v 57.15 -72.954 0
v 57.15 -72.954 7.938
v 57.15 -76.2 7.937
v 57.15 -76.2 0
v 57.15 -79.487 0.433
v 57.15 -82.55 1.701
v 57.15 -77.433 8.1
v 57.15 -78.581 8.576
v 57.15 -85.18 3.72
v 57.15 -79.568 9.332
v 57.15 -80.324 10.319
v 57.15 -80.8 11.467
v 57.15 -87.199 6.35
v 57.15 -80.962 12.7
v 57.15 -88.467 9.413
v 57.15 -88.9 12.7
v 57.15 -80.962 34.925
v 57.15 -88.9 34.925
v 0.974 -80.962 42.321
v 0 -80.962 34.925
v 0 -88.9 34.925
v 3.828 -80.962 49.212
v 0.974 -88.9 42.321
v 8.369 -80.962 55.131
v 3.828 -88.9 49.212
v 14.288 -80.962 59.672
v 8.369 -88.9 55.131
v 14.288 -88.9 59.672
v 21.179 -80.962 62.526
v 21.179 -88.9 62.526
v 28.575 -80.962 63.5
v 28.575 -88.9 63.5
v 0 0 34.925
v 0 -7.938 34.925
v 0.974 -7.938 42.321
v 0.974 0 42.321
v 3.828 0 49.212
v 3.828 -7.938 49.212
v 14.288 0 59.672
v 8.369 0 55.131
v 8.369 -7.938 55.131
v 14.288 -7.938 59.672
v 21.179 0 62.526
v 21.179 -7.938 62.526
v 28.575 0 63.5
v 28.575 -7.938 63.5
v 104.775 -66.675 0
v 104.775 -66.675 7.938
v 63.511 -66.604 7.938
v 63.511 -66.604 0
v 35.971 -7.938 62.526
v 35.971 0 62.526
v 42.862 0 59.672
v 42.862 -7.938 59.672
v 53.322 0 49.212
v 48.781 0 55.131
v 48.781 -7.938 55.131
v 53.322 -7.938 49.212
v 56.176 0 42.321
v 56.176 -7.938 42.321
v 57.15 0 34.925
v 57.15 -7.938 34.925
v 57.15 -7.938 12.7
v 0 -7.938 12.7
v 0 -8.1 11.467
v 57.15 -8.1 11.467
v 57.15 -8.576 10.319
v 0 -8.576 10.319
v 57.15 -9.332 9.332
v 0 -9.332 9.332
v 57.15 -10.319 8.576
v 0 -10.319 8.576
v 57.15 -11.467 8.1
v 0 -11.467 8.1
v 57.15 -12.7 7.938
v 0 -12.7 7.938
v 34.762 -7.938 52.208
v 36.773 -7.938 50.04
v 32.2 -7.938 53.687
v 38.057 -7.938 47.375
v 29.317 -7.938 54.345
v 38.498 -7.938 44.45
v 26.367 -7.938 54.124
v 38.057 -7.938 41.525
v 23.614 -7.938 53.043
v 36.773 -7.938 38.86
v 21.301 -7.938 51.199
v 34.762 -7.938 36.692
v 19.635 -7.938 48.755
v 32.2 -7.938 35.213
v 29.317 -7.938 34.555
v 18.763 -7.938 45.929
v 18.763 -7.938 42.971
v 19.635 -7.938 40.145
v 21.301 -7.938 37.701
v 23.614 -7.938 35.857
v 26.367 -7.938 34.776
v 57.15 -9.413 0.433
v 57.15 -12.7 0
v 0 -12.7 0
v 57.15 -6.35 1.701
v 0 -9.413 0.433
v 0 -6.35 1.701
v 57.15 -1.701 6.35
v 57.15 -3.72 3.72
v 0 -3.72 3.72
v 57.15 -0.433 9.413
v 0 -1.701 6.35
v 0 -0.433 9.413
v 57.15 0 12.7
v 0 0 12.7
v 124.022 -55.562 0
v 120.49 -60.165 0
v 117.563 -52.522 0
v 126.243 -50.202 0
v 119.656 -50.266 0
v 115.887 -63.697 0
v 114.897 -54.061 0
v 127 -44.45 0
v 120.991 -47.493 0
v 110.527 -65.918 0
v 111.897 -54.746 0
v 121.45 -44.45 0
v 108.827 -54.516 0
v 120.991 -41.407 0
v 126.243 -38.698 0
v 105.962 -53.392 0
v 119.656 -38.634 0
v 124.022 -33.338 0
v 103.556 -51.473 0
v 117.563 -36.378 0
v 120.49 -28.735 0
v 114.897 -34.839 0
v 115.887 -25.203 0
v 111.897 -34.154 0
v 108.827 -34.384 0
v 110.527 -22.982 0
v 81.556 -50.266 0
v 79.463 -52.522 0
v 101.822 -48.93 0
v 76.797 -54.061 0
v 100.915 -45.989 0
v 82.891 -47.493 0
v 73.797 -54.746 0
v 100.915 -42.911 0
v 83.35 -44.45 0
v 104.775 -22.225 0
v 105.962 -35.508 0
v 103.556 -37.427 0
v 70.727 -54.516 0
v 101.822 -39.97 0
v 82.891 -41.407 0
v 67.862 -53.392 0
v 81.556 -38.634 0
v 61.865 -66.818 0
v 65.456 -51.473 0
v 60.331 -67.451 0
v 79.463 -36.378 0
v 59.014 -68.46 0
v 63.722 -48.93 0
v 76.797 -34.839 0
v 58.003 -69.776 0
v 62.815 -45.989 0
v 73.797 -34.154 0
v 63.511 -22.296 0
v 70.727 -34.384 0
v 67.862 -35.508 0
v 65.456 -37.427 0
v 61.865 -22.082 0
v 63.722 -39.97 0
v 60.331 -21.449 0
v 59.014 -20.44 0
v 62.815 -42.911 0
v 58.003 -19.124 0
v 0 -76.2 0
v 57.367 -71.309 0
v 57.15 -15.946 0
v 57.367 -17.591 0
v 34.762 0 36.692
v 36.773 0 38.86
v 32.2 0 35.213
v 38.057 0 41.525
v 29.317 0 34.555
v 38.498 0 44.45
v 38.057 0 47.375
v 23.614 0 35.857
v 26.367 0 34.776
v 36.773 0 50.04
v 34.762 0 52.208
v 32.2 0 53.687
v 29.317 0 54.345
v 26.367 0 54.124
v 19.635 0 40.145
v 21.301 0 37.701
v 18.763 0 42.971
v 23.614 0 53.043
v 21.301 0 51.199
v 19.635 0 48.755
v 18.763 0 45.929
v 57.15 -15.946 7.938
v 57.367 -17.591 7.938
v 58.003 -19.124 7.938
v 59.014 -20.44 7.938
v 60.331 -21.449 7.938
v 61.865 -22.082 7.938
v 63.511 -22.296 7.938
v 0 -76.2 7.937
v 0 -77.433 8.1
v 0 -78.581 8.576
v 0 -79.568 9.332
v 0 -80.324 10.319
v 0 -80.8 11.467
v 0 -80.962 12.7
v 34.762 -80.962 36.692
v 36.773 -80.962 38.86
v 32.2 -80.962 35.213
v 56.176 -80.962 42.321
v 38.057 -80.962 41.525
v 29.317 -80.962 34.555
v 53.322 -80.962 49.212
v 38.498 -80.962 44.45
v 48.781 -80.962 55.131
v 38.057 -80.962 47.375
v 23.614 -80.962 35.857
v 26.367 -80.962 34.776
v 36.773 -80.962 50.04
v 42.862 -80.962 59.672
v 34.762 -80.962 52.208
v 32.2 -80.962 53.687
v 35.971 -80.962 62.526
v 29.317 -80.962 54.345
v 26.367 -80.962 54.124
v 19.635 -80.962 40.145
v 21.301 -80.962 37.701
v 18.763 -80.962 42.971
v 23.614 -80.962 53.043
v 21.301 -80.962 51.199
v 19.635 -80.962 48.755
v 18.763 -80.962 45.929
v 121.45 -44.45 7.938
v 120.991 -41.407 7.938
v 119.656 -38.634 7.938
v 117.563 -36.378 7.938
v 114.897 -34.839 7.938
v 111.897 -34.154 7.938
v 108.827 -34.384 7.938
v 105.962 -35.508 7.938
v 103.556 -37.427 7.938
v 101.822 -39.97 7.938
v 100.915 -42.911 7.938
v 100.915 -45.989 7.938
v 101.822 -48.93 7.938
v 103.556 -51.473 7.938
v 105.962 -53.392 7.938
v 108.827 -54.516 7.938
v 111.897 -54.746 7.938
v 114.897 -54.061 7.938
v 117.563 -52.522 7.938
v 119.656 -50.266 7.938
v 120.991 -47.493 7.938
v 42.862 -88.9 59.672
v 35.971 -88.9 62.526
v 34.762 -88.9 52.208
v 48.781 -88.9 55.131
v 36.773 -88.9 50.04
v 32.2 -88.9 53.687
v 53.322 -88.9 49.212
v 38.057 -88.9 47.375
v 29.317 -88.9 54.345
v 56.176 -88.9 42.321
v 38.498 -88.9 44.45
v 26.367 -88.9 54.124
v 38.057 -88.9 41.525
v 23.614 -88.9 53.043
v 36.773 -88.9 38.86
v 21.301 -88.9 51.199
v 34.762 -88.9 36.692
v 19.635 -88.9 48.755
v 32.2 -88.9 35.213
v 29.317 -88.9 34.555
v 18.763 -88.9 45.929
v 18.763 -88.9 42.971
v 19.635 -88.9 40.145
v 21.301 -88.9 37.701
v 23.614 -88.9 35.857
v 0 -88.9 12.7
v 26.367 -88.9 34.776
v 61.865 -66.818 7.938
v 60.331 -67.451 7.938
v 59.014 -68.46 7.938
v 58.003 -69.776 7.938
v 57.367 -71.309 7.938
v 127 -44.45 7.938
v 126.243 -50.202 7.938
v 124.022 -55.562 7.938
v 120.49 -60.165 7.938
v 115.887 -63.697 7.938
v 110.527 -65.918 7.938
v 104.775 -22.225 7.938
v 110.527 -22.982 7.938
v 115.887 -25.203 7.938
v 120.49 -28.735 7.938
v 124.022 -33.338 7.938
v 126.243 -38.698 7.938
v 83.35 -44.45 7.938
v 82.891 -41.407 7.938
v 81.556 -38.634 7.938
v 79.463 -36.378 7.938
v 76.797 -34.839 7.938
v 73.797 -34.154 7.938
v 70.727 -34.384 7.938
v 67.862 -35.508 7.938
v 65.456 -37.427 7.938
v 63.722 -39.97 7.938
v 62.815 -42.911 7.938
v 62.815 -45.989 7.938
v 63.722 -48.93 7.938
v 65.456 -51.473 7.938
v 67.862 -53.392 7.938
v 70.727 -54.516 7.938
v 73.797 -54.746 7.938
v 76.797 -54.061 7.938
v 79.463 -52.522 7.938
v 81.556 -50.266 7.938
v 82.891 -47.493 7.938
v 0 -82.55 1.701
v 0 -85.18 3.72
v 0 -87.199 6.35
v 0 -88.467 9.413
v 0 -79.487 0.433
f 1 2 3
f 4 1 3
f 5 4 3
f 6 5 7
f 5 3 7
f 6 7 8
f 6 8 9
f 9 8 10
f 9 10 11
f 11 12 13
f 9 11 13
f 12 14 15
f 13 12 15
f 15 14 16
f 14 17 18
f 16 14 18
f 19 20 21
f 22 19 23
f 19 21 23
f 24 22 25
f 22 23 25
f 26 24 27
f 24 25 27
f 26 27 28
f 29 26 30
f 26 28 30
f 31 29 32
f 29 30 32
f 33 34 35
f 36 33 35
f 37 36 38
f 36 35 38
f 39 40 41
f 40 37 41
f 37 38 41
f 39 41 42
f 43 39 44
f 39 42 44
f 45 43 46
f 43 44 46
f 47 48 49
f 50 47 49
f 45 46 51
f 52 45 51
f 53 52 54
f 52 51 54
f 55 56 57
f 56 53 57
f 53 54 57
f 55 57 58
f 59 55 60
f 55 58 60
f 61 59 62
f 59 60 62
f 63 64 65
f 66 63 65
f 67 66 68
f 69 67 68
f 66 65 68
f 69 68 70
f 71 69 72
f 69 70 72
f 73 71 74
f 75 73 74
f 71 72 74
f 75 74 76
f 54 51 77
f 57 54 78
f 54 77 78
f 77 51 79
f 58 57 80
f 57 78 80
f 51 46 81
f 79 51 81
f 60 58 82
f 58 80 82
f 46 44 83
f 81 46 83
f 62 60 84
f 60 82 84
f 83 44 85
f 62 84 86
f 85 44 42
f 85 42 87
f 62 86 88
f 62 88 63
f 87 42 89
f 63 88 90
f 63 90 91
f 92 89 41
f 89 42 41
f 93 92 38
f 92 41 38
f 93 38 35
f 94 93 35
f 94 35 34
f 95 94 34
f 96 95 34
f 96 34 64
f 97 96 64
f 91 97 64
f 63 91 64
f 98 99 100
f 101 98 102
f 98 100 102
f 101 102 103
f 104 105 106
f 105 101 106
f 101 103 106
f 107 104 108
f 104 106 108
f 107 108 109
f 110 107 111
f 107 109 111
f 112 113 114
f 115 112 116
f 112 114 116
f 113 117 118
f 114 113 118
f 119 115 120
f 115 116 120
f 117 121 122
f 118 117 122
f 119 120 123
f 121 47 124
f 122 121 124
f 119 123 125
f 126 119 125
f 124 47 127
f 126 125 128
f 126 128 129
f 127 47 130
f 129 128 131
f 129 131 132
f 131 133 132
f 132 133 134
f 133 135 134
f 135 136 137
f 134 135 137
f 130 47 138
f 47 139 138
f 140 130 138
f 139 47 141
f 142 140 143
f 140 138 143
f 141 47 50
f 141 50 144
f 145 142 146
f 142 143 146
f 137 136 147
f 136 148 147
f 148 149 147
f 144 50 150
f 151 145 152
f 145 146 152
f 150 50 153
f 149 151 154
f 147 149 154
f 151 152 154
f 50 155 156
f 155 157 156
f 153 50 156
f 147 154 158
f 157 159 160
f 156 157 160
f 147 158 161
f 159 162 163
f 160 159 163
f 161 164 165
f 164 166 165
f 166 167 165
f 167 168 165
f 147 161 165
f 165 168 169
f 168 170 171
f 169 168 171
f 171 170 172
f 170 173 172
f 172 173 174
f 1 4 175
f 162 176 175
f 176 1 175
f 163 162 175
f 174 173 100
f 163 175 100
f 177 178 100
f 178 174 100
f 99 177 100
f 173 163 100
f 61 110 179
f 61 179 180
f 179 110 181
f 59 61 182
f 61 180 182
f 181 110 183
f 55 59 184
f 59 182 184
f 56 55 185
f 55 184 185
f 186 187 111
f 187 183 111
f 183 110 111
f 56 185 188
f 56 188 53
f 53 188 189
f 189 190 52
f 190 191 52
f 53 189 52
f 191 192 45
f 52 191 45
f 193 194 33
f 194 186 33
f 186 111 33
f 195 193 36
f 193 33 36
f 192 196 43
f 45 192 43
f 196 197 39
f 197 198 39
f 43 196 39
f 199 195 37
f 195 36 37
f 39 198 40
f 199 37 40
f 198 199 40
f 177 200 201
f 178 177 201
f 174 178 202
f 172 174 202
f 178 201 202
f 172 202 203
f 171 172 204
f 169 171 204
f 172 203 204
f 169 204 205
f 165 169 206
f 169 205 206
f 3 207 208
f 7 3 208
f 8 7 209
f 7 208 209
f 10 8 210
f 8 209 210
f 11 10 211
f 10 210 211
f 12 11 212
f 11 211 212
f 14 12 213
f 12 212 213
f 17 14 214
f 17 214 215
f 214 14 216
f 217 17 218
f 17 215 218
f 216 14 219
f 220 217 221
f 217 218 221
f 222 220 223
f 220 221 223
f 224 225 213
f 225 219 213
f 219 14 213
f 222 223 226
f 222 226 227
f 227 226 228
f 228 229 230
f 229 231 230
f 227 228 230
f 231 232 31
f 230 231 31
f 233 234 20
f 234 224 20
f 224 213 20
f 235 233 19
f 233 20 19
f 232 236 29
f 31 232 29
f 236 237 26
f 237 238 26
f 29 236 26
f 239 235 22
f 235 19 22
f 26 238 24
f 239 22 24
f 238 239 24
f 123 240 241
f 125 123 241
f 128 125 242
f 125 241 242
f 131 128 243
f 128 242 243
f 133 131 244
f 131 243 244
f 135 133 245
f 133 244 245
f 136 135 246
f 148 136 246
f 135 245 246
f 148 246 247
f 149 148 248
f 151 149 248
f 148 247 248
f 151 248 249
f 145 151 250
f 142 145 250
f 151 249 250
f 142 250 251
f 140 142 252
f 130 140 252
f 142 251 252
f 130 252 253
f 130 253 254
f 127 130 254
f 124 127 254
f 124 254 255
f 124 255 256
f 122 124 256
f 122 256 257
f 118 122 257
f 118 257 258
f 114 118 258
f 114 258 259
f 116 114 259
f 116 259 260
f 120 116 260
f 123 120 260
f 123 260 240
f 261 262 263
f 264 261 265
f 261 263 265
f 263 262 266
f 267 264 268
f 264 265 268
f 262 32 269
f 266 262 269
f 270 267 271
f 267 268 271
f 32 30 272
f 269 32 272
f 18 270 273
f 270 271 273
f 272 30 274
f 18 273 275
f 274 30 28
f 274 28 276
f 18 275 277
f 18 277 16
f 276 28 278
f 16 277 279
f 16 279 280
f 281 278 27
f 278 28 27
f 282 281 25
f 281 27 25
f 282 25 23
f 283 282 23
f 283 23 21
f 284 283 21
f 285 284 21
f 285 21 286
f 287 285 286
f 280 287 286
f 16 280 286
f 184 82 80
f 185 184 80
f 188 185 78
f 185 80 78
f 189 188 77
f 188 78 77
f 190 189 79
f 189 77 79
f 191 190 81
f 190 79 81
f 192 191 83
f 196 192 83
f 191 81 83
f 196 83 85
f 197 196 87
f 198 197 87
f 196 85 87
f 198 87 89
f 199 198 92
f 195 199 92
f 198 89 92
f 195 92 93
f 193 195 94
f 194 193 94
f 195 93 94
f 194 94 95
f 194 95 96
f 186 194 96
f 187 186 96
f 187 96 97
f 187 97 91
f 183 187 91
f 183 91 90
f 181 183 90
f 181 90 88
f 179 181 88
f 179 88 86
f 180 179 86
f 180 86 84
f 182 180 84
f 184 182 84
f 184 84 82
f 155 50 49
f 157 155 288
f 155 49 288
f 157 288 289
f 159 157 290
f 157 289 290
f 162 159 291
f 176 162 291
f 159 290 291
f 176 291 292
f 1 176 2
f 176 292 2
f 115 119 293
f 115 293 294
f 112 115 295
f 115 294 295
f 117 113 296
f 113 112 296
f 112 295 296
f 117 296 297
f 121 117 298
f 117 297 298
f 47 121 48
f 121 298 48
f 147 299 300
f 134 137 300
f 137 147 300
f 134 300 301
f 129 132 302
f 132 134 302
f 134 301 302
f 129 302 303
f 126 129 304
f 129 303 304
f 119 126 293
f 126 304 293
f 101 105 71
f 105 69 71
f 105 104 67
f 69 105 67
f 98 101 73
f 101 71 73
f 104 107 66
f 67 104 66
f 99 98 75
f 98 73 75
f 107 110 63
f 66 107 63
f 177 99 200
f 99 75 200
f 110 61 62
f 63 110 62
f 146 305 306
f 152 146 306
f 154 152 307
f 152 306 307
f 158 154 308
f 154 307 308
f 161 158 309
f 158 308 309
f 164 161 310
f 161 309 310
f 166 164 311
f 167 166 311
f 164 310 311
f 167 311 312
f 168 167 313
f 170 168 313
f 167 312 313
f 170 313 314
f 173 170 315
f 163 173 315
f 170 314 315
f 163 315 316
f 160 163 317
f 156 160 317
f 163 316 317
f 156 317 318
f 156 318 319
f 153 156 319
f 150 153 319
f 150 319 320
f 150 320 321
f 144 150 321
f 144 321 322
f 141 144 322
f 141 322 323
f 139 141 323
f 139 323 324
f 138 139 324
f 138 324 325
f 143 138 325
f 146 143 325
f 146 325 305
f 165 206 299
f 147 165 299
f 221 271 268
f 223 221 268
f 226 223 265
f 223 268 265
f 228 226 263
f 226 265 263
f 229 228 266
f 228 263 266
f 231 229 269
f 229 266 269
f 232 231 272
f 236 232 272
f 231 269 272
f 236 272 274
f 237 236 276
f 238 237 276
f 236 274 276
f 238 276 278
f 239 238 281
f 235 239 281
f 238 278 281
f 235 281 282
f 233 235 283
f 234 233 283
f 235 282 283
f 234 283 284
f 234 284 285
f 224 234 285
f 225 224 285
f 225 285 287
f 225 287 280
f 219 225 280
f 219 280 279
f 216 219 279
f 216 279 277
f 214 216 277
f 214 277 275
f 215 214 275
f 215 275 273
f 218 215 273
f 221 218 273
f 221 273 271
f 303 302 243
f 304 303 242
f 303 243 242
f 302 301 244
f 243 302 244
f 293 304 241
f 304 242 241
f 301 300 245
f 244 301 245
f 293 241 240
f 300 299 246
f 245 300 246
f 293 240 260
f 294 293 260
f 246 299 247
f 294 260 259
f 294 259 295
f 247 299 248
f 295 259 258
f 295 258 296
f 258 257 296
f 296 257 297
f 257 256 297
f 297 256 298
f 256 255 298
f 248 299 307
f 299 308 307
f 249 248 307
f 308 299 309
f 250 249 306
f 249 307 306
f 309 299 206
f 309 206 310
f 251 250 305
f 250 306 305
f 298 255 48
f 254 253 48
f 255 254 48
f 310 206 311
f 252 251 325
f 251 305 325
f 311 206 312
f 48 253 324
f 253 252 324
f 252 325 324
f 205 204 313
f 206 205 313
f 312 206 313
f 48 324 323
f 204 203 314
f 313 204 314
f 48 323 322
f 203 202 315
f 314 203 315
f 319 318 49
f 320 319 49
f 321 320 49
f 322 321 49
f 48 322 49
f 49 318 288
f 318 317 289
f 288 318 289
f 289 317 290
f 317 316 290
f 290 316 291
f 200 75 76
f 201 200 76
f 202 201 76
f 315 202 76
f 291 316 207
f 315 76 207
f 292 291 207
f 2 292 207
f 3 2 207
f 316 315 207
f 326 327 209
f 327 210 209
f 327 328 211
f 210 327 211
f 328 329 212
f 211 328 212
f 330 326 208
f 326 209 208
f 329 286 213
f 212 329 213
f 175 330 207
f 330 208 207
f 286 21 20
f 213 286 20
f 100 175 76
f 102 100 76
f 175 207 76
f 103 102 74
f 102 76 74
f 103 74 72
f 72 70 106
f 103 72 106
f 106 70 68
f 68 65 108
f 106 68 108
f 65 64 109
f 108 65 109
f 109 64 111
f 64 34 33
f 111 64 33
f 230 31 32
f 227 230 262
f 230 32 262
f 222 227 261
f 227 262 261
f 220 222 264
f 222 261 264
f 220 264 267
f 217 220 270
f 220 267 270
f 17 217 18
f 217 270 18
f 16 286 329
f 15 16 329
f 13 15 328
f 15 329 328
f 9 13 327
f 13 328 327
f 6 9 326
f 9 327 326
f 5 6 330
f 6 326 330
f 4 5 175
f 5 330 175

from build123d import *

# Parameters (mm, degrees)
F1_DEPTH = 127
F3_DEPTH = 88.901
F5_DEPTH = 63.501
F6_R     = 9.92251
F7_DEPTH = 88.901
F8_R     = 10.3251
F9_DEPTH = 25.4


with BuildPart() as f1:
    # F0 (on Right) → F1 (new body)
    with BuildSketch(Plane.YZ):
        with BuildLine():
            Line((-76.2, 0), (-12.7, 0))
            ThreePointArc((-12.7, 0), (-3.719744, 3.719744), (0, 12.7))
            Line((0, 12.7), (0, 63.5))
            Line((0, 63.5), (-7.9375, 63.5))
            Line((-7.9375, 63.5), (-7.9375, 12.7))
            ThreePointArc((-7.9375, 12.7), (-9.332404, 9.332404), (-12.7, 7.9375))
            Line((-12.7, 7.9375), (-76.2, 7.9375))
            ThreePointArc((-76.2, 7.9375), (-79.567596, 9.332404), (-80.9625, 12.7))
            Line((-80.9625, 12.7), (-80.9625, 63.5))
            Line((-80.9625, 63.5), (-88.9, 63.5))
            Line((-88.9, 63.5), (-88.9, 12.7))
            ThreePointArc((-88.9, 12.7), (-85.180256, 3.719744), (-76.2, 0))
        make_face()
    extrude(amount=F1_DEPTH)

    # F2 (on face) → F3 (cut, through all)
    with BuildSketch(Plane.XZ.offset(88.9)):
        with BuildLine():
            Line((0, 63.5), (0, 34.925))
            ThreePointArc((0, 34.925), (8.369424, 55.130576), (28.575, 63.5))
            Line((28.575, 63.5), (0, 63.5))
        make_face()
        with BuildLine():
            ThreePointArc((28.575, 63.5), (48.780576, 55.130576), (57.15, 34.925))
            Line((57.15, 34.925), (57.15, 63.5))
            Line((57.15, 63.5), (28.575, 63.5))
        make_face()
    extrude(amount=-F3_DEPTH, mode=Mode.SUBTRACT)

    # F4 (on face) → F5 (cut, through all)
    with BuildSketch(Plane.XY.offset(63.5)):
        with BuildLine():
            Line((127, 0), (57.15, 0))
            Line((57.15, 0), (57.15, -15.945885))
            ThreePointArc((57.15, -15.945885), (59.01373, -20.439868), (63.510907, -22.295876))
            Line((63.510907, -22.295876), (104.775, -22.225))
            ThreePointArc((104.775, -22.225), (120.490448, -28.734552), (127, -44.45))
            Line((127, -44.45), (127, 0))
        make_face()
        with BuildLine():
            Line((127, -88.9), (127, -44.45))
            ThreePointArc((127, -44.45), (120.490448, -60.165448), (104.775, -66.675))
            Line((104.775, -66.675), (63.510907, -66.604124))
            ThreePointArc((63.510907, -66.604124), (59.01373, -68.460132), (57.15, -72.954115))
            Line((57.15, -72.954115), (57.15, -88.9))
            Line((57.15, -88.9), (127, -88.9))
        make_face()
    extrude(amount=-F5_DEPTH, mode=Mode.SUBTRACT)

    # F6 (on face) → F7 (cut, through all)
    with BuildSketch(Plane.XZ.offset(88.9)):
        with Locations((28.575, 44.45)):
            Circle(F6_R)
    extrude(amount=-F7_DEPTH, mode=Mode.SUBTRACT)

    # F8 (on face) → F9 (cut)
    with BuildSketch(Plane.XY.offset(7.9375)):
        with Locations((73.025, -44.45)):
            Circle(F8_R)
        with Locations((111.125, -44.45)):
            Circle(F8_R)
    extrude(amount=-F9_DEPTH, mode=Mode.SUBTRACT)


solid = f1.part
